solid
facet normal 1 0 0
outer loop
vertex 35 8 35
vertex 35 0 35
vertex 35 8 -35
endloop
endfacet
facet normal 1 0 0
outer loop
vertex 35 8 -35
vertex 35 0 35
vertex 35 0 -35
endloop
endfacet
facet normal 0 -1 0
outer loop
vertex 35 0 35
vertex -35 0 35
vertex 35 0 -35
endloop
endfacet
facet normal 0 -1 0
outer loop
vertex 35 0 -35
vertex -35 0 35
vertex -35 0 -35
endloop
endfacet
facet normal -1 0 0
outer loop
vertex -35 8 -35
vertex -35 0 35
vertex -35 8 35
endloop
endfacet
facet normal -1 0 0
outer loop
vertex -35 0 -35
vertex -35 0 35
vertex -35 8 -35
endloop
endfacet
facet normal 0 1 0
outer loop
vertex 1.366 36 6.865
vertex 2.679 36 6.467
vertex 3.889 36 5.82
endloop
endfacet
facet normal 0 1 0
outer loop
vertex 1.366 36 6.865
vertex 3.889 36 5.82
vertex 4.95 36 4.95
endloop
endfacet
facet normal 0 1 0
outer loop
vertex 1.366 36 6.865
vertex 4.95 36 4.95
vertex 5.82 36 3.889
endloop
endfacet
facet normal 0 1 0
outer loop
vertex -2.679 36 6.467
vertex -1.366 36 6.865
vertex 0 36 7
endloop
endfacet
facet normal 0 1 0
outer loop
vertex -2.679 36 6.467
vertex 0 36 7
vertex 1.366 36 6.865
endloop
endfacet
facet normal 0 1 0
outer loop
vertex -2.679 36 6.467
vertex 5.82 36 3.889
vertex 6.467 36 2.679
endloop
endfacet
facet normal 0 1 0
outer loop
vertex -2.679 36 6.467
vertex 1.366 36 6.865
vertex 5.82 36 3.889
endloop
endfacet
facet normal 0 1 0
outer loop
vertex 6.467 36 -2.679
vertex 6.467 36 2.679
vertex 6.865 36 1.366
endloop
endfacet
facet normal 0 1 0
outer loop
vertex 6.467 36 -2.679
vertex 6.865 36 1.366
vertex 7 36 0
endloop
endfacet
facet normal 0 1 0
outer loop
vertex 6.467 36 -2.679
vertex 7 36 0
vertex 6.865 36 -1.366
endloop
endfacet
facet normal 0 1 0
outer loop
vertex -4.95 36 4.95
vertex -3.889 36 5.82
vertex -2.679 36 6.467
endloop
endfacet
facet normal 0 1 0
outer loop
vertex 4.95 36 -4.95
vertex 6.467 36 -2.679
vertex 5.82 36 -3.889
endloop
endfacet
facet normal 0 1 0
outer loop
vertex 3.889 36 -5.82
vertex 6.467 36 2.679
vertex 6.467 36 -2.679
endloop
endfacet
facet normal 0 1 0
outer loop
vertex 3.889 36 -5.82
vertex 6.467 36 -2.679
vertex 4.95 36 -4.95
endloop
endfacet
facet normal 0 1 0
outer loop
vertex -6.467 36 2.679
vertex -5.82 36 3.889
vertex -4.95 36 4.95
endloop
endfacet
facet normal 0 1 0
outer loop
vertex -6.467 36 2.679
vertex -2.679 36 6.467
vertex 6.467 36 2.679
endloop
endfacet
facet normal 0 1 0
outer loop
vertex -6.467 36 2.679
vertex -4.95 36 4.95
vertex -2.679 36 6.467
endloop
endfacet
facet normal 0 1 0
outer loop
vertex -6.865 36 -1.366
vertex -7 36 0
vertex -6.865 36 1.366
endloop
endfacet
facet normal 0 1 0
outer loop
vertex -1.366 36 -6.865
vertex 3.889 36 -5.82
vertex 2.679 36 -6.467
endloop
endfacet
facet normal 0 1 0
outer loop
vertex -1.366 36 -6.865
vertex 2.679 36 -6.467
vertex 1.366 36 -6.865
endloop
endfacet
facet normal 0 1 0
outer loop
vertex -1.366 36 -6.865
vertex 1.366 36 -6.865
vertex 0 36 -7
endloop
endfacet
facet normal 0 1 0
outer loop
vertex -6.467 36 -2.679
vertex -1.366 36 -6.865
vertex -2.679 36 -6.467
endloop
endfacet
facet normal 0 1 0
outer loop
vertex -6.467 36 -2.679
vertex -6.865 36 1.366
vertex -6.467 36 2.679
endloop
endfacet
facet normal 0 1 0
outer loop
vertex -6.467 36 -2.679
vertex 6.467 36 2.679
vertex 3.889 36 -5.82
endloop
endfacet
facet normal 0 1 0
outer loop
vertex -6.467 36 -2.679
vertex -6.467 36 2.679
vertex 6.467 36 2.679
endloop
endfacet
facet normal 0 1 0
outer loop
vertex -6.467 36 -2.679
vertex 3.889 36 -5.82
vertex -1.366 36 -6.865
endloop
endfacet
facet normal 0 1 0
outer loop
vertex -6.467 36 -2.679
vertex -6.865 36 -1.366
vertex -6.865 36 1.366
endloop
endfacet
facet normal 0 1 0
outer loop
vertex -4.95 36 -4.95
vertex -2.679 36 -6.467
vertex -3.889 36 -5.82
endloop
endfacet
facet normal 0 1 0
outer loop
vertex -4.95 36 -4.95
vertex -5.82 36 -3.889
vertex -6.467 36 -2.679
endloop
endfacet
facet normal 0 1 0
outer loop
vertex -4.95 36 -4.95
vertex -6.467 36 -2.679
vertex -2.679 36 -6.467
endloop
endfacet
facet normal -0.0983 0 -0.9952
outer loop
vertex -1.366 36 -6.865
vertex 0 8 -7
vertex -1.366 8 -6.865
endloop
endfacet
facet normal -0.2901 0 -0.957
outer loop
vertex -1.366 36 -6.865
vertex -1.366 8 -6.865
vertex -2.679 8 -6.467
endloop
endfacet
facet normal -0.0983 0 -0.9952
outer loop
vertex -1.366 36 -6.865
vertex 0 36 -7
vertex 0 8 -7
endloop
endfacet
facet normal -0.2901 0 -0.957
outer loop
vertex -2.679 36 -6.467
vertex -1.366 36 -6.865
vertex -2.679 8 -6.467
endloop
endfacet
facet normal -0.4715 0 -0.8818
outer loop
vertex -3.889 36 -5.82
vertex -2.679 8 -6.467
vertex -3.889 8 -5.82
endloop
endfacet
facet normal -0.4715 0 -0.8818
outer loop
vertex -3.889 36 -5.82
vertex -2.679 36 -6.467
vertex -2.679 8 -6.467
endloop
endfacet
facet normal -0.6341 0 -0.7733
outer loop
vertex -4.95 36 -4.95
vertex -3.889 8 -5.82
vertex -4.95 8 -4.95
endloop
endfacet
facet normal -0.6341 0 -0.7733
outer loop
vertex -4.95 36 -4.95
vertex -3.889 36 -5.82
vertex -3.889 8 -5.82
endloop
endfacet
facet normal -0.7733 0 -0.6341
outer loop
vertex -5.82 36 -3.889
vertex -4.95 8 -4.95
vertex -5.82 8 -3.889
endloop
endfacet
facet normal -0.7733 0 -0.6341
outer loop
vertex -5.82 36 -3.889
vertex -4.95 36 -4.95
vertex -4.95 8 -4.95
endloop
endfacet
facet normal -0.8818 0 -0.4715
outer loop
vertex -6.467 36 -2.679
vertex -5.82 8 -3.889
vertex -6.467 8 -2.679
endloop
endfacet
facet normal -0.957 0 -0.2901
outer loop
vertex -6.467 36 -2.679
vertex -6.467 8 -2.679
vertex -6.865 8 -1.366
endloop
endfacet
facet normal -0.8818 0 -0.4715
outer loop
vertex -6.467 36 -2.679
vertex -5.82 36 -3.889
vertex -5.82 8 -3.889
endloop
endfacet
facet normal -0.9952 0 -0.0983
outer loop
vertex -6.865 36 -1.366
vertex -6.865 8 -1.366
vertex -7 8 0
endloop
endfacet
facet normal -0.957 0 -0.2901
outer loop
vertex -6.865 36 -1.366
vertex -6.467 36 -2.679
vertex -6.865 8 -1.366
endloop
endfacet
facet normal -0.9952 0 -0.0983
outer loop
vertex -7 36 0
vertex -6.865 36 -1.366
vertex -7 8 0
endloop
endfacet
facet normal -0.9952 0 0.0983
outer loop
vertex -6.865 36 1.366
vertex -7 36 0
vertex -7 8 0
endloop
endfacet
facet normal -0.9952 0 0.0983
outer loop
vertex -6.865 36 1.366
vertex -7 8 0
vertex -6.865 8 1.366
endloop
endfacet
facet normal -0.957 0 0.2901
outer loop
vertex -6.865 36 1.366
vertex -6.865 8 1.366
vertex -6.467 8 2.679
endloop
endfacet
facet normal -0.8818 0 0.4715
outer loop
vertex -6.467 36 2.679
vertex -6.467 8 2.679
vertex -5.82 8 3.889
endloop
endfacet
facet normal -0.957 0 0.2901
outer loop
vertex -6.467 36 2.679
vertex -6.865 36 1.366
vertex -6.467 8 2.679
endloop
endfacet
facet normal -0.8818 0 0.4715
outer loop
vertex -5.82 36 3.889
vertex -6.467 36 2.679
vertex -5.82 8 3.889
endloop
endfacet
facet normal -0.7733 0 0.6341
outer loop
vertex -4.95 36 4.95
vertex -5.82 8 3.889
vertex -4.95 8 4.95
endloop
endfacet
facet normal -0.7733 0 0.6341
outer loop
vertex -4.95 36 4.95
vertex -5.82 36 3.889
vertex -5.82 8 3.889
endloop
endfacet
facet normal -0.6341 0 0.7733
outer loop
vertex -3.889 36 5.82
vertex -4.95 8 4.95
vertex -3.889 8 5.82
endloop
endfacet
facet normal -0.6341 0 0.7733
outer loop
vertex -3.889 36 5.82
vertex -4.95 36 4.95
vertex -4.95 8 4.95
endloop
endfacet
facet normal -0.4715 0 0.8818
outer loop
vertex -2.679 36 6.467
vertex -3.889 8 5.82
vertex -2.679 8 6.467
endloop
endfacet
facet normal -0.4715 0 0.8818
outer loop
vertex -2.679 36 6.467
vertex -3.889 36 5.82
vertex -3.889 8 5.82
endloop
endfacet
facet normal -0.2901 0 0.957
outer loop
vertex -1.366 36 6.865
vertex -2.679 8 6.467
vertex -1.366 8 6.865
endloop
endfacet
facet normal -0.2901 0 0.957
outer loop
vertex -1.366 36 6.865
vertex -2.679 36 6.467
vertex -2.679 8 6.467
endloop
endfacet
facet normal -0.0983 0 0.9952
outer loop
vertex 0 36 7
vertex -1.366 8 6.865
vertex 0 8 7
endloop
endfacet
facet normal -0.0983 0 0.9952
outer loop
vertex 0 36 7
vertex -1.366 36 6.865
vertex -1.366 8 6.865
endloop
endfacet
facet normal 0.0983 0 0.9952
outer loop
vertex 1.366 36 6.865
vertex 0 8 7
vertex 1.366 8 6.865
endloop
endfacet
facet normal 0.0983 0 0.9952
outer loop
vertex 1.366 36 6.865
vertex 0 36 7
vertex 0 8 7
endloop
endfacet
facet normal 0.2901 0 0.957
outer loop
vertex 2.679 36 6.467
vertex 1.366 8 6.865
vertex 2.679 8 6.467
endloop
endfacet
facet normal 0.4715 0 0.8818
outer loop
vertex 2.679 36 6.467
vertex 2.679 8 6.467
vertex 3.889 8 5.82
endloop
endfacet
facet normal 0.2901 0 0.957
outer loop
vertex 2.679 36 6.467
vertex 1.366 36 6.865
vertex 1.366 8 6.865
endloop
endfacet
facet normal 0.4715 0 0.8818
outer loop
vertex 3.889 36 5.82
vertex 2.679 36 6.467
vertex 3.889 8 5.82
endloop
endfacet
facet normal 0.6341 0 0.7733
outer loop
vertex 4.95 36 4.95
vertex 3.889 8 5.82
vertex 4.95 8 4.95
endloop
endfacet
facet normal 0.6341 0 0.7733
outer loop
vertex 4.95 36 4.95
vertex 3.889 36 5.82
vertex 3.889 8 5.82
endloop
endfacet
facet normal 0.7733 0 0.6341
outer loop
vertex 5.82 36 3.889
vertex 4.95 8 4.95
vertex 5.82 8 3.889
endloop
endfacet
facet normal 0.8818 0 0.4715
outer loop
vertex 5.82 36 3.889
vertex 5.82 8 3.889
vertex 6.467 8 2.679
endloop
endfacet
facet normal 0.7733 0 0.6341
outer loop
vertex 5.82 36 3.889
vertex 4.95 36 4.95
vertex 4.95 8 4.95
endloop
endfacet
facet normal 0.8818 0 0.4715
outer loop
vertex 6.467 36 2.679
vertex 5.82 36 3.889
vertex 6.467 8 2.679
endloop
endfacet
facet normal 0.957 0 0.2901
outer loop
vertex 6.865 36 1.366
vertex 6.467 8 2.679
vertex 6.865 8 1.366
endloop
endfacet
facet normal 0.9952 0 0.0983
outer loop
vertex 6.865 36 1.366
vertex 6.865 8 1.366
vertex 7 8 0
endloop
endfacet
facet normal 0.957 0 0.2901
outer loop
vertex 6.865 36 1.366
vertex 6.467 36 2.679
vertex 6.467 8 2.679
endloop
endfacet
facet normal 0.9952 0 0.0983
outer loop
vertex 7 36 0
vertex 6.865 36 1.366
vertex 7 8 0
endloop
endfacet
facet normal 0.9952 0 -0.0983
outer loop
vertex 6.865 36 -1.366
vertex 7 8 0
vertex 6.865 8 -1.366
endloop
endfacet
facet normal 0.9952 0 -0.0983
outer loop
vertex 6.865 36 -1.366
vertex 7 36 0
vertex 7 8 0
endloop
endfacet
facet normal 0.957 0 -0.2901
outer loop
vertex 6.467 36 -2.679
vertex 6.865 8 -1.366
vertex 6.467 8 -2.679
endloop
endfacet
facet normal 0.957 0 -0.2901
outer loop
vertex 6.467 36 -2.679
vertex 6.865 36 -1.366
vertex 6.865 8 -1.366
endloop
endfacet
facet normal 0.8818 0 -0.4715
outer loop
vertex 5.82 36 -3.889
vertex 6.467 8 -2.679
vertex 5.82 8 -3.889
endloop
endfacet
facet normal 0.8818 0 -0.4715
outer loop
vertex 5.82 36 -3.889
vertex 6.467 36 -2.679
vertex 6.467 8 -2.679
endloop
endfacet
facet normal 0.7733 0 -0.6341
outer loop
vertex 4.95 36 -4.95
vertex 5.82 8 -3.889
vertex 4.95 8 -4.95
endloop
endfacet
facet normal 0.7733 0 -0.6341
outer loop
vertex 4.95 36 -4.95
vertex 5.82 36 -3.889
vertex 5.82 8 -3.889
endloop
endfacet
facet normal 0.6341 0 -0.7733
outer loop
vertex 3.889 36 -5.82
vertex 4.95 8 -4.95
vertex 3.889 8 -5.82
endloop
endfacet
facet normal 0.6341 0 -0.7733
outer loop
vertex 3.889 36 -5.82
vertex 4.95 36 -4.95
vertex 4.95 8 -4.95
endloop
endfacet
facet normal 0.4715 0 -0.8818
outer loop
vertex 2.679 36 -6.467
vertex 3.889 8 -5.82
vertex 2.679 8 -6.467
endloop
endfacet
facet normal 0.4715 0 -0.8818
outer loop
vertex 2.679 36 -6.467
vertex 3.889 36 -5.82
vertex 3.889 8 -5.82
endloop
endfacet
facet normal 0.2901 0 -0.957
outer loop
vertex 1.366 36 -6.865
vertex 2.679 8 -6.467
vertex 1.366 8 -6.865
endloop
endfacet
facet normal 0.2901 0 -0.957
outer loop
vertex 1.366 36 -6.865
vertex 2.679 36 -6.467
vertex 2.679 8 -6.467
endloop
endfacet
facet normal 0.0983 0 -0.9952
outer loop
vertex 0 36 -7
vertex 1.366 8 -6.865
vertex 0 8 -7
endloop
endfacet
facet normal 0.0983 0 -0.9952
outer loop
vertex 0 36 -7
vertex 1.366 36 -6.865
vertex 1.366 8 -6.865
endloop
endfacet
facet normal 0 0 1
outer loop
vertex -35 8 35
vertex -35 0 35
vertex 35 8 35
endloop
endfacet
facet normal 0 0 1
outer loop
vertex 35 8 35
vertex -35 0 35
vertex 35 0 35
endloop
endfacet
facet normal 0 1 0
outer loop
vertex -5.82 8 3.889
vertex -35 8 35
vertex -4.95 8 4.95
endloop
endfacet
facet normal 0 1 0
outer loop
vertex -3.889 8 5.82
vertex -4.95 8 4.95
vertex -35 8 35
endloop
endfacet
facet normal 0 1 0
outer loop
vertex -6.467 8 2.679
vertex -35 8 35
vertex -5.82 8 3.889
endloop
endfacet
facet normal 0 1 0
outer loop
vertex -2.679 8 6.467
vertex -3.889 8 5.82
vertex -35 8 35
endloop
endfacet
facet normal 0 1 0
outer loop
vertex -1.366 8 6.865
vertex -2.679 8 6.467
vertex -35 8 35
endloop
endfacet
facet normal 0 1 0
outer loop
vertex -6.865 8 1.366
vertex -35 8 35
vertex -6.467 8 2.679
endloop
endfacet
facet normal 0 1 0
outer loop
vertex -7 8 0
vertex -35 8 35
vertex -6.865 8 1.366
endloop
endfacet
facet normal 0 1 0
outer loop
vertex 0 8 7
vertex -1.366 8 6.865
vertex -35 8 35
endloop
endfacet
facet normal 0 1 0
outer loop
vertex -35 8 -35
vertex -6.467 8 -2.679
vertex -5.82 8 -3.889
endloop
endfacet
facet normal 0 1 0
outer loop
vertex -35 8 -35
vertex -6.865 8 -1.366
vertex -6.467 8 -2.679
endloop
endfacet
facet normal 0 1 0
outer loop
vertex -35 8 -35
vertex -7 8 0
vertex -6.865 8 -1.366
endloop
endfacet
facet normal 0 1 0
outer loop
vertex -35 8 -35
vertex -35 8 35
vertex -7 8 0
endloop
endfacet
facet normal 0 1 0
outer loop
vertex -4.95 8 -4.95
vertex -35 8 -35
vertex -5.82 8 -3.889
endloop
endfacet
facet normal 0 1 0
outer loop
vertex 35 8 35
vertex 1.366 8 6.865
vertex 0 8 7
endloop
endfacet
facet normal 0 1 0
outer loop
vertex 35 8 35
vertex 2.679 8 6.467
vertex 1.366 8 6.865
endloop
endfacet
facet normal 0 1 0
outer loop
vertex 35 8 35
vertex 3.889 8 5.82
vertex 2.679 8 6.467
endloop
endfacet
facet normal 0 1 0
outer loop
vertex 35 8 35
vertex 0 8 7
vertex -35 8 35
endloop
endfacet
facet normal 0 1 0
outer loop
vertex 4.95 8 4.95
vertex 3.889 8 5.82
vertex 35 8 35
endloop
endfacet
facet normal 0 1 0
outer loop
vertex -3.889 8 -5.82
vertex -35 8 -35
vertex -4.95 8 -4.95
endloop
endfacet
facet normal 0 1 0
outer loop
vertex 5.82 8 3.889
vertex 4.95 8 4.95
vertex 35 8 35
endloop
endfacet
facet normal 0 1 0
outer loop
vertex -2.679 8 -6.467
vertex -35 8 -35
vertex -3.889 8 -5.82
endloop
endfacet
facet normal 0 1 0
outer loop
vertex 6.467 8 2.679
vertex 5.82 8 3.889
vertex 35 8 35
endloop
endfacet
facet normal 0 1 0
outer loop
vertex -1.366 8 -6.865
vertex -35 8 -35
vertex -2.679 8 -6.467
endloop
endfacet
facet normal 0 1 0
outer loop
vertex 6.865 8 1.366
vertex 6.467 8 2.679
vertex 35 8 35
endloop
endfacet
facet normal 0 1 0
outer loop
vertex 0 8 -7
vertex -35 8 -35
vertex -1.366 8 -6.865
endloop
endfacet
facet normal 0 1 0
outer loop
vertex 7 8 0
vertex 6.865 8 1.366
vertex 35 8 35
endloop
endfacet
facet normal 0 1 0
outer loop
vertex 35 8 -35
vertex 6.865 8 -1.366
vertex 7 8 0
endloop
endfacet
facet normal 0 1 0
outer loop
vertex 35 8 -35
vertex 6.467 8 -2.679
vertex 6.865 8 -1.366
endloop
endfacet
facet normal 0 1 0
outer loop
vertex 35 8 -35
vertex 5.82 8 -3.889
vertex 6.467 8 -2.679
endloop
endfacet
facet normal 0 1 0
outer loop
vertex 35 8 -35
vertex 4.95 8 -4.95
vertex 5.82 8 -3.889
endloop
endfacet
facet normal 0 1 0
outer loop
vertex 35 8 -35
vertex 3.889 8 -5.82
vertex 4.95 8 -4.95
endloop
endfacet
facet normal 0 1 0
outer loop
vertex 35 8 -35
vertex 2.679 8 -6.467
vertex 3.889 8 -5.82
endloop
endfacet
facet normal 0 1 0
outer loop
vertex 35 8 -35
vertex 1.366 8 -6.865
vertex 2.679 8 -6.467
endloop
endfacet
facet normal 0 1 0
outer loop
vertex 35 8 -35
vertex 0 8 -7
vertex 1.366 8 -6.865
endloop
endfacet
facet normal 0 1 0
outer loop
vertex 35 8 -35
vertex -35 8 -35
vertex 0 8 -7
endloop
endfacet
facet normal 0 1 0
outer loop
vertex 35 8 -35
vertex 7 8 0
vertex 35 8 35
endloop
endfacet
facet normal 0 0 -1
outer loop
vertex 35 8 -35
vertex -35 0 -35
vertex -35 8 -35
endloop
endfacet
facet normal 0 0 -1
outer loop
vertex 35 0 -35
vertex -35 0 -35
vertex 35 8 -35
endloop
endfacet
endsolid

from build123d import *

# Parameters (mm, degrees)
SKETCH1_W           = 70
SKETCH1_H           = 70
BOSS_EXTRUDE1_DEPTH = 8
SKETCH3_W           = 7
SKETCH3_H           = 36


with BuildPart() as part:
    # Sketch1 → Boss-Extrude1 (new body)
    with BuildSketch(Plane(origin=(0, 0, 0), x_dir=(1, 0, 0), z_dir=(0, 1, 0))):
        Rectangle(SKETCH1_W, SKETCH1_H)
    extrude(amount=BOSS_EXTRUDE1_DEPTH)

    # Sketch3 → Revolve1 (revolve)
    with BuildSketch(Plane.XY, mode=Mode.PRIVATE) as revolve1_sk:
        with Locations((-3.5, 18)):
            Rectangle(SKETCH3_W, SKETCH3_H)
    revolve(revolve1_sk.sketch.rotate(Axis((0, -7.263286828, 0), (0, 1, 0)), 270), axis=Axis((0, -7.263286828, 0), (0, 1, 0)))


solid = part.part
